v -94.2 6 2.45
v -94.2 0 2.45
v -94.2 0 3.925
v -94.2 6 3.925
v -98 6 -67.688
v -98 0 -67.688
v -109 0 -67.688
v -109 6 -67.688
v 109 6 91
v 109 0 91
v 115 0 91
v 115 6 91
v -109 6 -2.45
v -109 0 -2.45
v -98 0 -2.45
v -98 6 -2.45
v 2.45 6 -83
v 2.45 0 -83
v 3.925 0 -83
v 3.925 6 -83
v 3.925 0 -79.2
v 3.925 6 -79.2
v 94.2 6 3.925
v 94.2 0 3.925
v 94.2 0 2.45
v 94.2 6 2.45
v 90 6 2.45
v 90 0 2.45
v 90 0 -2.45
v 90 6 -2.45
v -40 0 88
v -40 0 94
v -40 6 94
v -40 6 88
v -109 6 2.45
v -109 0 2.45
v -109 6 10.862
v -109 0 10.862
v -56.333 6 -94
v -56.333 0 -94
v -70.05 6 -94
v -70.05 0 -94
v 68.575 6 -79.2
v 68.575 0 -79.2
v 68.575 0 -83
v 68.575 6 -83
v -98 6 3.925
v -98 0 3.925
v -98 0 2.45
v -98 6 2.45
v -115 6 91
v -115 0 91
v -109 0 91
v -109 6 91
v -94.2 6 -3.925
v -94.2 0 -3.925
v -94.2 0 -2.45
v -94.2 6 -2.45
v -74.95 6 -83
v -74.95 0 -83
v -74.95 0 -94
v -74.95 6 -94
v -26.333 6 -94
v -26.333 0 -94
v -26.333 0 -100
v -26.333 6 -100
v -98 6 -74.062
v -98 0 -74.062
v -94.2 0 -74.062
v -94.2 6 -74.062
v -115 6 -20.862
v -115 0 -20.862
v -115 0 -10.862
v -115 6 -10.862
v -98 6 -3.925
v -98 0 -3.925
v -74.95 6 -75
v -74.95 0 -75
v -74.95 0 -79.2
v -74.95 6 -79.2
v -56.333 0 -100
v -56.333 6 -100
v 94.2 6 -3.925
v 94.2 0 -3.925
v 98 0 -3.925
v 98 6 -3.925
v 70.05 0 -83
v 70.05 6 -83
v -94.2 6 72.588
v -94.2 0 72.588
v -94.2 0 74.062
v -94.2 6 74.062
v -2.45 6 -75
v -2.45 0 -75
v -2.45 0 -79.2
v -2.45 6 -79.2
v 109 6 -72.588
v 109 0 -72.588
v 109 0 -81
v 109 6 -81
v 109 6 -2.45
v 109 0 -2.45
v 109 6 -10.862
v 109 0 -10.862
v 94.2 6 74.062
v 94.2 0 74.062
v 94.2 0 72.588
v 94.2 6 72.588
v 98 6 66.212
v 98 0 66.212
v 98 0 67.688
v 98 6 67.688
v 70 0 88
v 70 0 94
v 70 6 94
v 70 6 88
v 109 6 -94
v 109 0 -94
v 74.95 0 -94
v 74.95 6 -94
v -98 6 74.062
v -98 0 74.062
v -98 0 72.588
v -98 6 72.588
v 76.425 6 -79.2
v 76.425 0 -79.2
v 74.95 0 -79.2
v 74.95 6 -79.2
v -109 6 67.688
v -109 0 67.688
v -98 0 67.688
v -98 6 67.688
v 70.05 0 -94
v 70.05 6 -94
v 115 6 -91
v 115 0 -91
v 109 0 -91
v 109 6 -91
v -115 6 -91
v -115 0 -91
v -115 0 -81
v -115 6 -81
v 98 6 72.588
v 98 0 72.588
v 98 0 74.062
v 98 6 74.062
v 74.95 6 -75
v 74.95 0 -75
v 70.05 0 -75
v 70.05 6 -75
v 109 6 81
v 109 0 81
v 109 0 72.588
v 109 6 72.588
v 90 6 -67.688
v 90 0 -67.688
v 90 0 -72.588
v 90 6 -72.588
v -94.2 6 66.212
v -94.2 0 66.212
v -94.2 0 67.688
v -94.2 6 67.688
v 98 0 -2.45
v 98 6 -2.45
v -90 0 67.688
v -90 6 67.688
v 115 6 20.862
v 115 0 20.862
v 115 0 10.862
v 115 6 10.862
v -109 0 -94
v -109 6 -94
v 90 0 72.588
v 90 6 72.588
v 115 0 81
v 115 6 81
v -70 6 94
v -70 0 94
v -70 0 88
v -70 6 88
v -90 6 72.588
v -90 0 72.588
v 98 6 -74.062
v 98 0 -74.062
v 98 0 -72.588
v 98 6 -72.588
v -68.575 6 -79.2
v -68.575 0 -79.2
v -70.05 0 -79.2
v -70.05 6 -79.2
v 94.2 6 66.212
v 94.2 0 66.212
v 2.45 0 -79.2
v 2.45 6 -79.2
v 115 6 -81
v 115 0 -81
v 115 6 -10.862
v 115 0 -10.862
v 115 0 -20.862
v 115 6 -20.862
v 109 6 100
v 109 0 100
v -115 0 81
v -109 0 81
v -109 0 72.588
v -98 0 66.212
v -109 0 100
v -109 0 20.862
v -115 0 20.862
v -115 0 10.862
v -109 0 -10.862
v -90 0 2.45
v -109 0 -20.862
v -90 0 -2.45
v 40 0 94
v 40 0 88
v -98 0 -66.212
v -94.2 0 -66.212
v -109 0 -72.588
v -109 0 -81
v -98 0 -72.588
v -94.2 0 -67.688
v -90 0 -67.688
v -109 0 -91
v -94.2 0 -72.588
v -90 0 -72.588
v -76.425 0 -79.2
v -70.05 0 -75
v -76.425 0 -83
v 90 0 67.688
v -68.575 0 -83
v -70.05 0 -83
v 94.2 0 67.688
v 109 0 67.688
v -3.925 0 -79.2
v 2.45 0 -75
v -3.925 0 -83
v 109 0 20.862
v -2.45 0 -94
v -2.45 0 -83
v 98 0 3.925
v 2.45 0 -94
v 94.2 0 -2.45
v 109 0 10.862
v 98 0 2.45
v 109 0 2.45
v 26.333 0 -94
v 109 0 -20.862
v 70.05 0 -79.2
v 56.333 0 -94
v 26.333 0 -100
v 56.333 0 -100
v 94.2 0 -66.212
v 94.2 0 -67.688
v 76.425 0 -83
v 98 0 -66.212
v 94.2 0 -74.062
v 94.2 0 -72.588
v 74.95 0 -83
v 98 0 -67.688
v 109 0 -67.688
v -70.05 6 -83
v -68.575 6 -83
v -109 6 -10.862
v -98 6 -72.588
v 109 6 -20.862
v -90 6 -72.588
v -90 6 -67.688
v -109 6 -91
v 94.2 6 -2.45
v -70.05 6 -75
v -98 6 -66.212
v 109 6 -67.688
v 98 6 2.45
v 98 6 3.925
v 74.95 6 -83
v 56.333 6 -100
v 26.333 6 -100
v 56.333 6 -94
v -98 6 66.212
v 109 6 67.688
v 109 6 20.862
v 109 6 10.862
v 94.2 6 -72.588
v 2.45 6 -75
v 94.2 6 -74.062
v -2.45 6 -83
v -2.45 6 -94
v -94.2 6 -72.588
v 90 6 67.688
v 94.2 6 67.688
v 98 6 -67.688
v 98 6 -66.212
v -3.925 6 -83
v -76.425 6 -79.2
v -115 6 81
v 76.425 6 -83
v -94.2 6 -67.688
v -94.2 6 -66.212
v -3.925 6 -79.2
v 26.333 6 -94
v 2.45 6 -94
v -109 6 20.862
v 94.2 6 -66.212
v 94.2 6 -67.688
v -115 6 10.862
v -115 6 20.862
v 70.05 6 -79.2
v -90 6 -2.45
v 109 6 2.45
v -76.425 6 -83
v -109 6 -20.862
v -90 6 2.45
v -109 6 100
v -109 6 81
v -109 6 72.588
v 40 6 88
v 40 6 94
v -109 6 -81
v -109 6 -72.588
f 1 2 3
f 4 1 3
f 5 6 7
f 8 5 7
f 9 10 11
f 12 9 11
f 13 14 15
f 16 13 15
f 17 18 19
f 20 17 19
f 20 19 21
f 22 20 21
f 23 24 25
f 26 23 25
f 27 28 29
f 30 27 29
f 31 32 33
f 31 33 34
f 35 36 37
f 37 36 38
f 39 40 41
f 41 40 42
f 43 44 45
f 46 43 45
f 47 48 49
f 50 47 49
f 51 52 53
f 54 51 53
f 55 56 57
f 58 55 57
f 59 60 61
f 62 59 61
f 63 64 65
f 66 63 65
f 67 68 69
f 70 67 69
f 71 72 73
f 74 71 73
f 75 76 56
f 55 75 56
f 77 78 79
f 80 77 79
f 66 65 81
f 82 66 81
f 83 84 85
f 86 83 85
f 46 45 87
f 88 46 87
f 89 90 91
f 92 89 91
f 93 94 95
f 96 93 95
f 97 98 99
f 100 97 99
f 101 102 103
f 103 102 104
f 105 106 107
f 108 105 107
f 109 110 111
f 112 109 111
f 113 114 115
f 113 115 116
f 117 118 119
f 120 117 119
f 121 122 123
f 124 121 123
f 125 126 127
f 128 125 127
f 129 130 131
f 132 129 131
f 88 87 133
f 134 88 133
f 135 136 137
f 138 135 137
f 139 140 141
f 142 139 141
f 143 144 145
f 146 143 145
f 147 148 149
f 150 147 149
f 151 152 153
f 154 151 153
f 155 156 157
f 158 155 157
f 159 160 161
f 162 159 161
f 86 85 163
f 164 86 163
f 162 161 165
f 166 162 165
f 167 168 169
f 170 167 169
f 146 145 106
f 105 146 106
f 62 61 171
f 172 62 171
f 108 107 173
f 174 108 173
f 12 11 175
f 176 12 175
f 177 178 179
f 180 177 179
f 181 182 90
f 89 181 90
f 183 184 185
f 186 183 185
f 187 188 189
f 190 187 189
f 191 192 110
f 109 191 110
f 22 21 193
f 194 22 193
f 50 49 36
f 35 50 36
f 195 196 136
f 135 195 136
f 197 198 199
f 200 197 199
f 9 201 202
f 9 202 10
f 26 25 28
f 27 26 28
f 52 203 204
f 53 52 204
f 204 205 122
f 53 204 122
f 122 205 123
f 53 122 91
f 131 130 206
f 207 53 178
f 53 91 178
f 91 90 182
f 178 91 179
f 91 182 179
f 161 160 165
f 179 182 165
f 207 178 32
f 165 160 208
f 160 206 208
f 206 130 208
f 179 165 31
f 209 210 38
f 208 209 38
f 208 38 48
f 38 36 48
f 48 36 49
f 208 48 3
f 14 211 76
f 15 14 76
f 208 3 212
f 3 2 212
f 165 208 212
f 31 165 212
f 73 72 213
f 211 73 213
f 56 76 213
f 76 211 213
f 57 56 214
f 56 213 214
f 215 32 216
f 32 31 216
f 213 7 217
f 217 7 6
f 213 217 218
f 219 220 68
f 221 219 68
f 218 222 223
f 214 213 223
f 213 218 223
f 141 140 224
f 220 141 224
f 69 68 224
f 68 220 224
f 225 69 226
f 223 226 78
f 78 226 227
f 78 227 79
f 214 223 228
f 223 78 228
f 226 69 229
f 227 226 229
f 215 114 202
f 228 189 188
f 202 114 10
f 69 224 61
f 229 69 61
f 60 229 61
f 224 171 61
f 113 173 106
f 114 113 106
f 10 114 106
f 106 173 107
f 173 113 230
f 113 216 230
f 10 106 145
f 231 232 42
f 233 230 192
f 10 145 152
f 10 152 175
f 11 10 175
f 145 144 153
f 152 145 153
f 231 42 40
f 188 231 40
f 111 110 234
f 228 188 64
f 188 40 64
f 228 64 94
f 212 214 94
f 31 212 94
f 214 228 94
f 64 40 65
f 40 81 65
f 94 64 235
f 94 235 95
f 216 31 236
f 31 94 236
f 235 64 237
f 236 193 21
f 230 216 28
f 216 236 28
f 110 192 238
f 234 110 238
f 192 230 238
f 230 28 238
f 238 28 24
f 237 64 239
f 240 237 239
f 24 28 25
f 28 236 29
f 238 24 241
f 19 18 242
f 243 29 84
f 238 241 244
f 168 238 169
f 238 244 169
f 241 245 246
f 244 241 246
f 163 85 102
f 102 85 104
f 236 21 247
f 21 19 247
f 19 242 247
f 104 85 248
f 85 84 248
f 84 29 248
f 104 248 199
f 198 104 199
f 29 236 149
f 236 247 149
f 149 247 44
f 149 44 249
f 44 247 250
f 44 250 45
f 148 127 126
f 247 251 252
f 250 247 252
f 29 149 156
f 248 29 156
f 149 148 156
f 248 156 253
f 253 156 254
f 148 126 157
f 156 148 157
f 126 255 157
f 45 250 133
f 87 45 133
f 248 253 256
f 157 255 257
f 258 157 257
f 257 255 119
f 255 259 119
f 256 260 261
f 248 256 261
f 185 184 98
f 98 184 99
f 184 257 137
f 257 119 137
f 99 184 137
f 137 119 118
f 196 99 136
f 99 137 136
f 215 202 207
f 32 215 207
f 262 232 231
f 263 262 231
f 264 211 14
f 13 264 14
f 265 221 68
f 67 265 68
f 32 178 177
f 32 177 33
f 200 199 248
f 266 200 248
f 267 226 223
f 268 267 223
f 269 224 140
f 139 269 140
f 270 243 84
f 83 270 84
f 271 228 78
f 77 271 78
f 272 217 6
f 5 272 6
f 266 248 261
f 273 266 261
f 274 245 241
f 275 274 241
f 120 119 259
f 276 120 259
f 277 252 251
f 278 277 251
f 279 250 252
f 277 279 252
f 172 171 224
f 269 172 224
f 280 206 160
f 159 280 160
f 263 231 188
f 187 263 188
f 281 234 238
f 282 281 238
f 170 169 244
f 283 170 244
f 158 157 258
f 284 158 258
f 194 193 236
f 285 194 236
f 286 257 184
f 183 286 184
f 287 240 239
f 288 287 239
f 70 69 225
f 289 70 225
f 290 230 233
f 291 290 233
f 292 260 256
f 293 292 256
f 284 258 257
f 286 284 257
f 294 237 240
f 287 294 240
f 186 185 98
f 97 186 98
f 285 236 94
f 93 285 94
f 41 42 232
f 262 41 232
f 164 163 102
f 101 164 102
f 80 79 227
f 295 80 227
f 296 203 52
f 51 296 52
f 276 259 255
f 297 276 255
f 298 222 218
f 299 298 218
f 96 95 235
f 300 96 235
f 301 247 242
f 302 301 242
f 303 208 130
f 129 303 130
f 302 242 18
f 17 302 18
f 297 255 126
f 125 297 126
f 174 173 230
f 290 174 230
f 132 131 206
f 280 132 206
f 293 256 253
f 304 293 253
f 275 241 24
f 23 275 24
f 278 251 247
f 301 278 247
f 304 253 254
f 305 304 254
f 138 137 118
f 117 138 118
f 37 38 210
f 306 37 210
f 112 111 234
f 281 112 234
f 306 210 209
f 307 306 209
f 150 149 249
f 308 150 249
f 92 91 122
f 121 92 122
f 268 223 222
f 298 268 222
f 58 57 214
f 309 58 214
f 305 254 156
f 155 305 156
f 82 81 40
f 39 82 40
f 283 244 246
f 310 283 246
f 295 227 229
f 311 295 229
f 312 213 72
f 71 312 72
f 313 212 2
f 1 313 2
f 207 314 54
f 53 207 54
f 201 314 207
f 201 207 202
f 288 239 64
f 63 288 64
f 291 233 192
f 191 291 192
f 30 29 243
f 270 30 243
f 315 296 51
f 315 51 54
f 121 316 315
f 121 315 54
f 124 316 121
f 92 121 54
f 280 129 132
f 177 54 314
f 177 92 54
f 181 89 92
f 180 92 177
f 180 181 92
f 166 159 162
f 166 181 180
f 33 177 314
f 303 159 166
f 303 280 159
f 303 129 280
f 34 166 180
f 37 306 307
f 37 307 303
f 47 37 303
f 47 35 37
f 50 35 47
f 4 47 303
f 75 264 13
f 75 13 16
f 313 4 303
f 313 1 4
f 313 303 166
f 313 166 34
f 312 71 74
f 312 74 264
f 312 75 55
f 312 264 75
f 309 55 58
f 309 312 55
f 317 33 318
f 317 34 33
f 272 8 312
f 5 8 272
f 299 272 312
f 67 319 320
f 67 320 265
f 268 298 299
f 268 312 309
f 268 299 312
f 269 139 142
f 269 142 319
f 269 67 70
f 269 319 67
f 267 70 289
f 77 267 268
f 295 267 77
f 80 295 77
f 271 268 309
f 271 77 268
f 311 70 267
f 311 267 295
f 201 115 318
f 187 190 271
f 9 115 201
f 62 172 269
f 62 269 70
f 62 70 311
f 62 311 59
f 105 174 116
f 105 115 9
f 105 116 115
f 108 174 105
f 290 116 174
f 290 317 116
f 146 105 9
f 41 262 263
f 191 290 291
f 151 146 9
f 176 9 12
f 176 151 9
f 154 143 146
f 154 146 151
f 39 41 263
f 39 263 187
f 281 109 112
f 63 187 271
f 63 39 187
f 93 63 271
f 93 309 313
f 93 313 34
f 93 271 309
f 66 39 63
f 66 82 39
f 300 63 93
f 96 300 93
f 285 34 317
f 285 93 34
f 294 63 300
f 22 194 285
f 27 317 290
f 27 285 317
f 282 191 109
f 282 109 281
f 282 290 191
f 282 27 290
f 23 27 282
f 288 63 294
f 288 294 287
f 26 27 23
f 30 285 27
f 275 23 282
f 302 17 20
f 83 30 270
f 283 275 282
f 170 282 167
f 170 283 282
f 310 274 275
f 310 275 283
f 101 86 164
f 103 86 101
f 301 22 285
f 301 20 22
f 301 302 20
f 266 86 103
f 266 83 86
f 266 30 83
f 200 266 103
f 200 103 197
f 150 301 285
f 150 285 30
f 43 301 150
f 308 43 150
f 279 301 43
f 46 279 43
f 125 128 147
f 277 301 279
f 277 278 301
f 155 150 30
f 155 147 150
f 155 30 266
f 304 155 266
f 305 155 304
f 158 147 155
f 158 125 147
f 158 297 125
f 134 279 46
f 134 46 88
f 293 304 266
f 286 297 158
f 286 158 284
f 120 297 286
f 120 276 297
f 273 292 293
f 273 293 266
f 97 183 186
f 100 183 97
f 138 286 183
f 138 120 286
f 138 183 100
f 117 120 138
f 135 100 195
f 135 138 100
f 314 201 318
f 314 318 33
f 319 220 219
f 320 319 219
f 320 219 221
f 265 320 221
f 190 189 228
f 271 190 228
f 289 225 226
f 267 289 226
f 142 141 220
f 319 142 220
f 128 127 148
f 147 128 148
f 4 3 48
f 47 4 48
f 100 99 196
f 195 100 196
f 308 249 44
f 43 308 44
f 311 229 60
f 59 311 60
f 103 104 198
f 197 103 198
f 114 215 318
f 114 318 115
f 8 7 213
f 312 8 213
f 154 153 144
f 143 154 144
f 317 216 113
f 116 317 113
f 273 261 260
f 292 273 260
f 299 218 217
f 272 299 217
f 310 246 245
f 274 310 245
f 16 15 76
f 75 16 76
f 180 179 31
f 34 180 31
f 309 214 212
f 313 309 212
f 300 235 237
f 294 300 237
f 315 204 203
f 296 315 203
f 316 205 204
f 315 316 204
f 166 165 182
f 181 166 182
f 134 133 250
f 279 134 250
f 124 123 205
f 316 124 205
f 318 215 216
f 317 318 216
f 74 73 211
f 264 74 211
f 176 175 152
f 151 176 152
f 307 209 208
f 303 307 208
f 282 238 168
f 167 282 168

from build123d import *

# Parameters (mm, degrees)
EXTRUDE_1_DEPTH          = 6
SKETCH_2_W               = 218
SKETCH_2_H               = 6
EXTRUDE_2_DEPTH          = 6
CUT_EXTRUDE_5_DEPTH      = 153.515572975
CUT_EXTRUDE_5_DEPTH_BACK = 153.515572975
SKETCH_9_W               = 30
SKETCH_9_H               = 6


with BuildPart() as part:
    # Эскиз1 → Бобышка-Вытянуть1 (new body)
    with BuildSketch(Plane(origin=(0, 0, 0), x_dir=(1, 0, 0), z_dir=(0, 1, 0))):
        Polygon((26.333333333, 100), (26.333333333, 94), (2.45, 94), (2.45, 83), (3.925, 83), (3.925, 79.2), (2.45, 79.2), (2.45, 75), (-2.45, 75), (-2.45, 79.2), (-3.925, 79.2), (-3.925, 83), (-2.45, 83), (-2.45, 94), (-26.333333333, 94), (-26.333333333, 100), (-56.333333333, 100), (-56.333333333, 94), (-70.05, 94), (-70.05, 83), (-68.575, 83), (-68.575, 79.2), (-70.05, 79.2), (-70.05, 75), (-74.95, 75), (-74.95, 79.2), (-76.425, 79.2), (-76.425, 83), (-74.95, 83), (-74.95, 94), (-109, 94), (-109, 91), (-115, 91), (-115, 81), (-109, 81), (-109, 72.5875), (-98, 72.5875), (-98, 74.0625), (-94.2, 74.0625), (-94.2, 72.5875), (-90, 72.5875), (-90, 67.6875), (-94.2, 67.6875), (-94.2, 66.2125), (-98, 66.2125), (-98, 67.6875), (-109, 67.6875), (-109, 20.8625), (-115, 20.8625), (-115, 10.8625), (-109, 10.8625), (-109, 2.45), (-98, 2.45), (-98, 3.925), (-94.2, 3.925), (-94.2, 2.45), (-90, 2.45), (-90, -2.45), (-94.2, -2.45), (-94.2, -3.925), (-98, -3.925), (-98, -2.45), (-109, -2.45), (-109, -10.8625), (-115, -10.8625), (-115, -20.8625), (-109, -20.8625), (-109, -67.6875), (-98, -67.6875), (-98, -66.2125), (-94.2, -66.2125), (-94.2, -67.6875), (-90, -67.6875), (-90, -72.5875), (-94.2, -72.5875), (-94.2, -74.0625), (-98, -74.0625), (-98, -72.5875), (-109, -72.5875), (-109, -81), (-115, -81), (-115, -91), (-109, -91), (-109, -94), (109, -94), (109, -91), (115, -91), (115, -81), (109, -81), (109, -72.5875), (98, -72.5875), (98, -74.0625), (94.2, -74.0625), (94.2, -72.5875), (90, -72.5875), (90, -67.6875), (94.2, -67.6875), (94.2, -66.2125), (98, -66.2125), (98, -67.6875), (109, -67.6875), (109, -20.8625), (115, -20.8625), (115, -10.8625), (109, -10.8625), (109, -2.45), (98, -2.45), (98, -3.925), (94.2, -3.925), (94.2, -2.45), (90, -2.45), (90, 2.45), (94.2, 2.45), (94.2, 3.925), (98, 3.925), (98, 2.45), (109, 2.45), (109, 10.8625), (115, 10.8625), (115, 20.8625), (109, 20.8625), (109, 67.6875), (98, 67.6875), (98, 66.2125), (94.2, 66.2125), (94.2, 67.6875), (90, 67.6875), (90, 72.5875), (94.2, 72.5875), (94.2, 74.0625), (98, 74.0625), (98, 72.5875), (109, 72.5875), (109, 81), (115, 81), (115, 91), (109, 91), (109, 94), (74.95, 94), (74.95, 83), (76.425, 83), (76.425, 79.2), (74.95, 79.2), (74.95, 75), (70.05, 75), (70.05, 79.2), (68.575, 79.2), (68.575, 83), (70.05, 83), (70.05, 94), (56.333333333, 94), (56.333333333, 100), align=None)
    extrude(amount=EXTRUDE_1_DEPTH)

    # Эскиз2 → Бобышка-Вытянуть2 (add)
    with BuildSketch(Plane(origin=(0, 6, 0), x_dir=(1, 0, 0), z_dir=(0, 1, 0))):
        with Locations((0, -97)):
            Rectangle(SKETCH_2_W, SKETCH_2_H)
    extrude(amount=-EXTRUDE_2_DEPTH)

    # Эскиз9 → Вырез-Вытянуть5 (cut, two sides: drawn at the far end of the back side and taken through both)
    with BuildSketch(Plane(origin=(0, 6, 0), x_dir=(1, 0, 0), z_dir=(0, 1, 0)).offset(-CUT_EXTRUDE_5_DEPTH_BACK)):
        with Locations((-55, -91)):
            Rectangle(SKETCH_9_W, SKETCH_9_H)
        with Locations((55, -91)):
            Rectangle(SKETCH_9_W, SKETCH_9_H)
    extrude(amount=CUT_EXTRUDE_5_DEPTH + CUT_EXTRUDE_5_DEPTH_BACK, mode=Mode.SUBTRACT)


solid = part.part
